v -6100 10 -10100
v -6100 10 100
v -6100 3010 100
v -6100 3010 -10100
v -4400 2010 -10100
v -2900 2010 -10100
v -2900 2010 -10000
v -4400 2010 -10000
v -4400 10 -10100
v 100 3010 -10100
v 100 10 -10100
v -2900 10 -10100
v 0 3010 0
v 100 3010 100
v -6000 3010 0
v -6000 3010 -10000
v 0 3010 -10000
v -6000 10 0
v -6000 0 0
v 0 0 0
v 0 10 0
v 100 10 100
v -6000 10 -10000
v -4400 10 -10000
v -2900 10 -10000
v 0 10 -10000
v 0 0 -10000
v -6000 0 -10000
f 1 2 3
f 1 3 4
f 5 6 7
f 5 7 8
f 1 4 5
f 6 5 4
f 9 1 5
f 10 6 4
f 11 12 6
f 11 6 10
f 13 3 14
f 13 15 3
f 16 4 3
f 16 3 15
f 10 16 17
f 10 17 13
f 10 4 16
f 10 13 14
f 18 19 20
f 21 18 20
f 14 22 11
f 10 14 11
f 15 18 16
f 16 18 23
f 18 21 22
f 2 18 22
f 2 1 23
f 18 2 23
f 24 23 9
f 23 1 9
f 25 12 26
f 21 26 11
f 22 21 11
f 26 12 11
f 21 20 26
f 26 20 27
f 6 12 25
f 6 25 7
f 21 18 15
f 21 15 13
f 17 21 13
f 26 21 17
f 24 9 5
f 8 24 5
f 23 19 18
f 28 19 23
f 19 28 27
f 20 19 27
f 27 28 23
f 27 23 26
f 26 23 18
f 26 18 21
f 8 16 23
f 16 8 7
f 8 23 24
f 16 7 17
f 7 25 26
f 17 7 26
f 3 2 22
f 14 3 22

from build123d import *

# Parameters (mm, degrees)
SKETCH1_W           = 6000
SKETCH1_H           = 10000
BOSS_EXTRUDE1_DEPTH = 10
SKETCH3_W           = 6200
SKETCH3_H           = 10200
SKETCH3_W_2         = 6000
SKETCH3_H_2         = 10000
BOSS_EXTRUDE2_DEPTH = 3000
SKETCH4_W           = 1500
SKETCH4_H           = 2000
CUT_EXTRUDE1_DEPTH  = 100


with BuildPart() as part:
    # Sketch1 → Boss-Extrude1 (new body)
    with BuildSketch(Plane(origin=(0, 0, 0), x_dir=(1, 0, 0), z_dir=(0, 1, 0))):
        with Locations((-3000, 5000)):
            Rectangle(SKETCH1_W, SKETCH1_H)
    extrude(amount=BOSS_EXTRUDE1_DEPTH)


with BuildPart() as body_2:
    # Sketch3 → Boss-Extrude2 (new body)
    with BuildSketch(Plane(origin=(0, 10, 0), x_dir=(1, 0, 0), z_dir=(0, 1, 0))):
        with Locations((-3000, 5000)):
            Rectangle(SKETCH3_W, SKETCH3_H)
        with Locations((-3000, 5000)):
            Rectangle(SKETCH3_W_2, SKETCH3_H_2, mode=Mode.SUBTRACT)
    extrude(amount=BOSS_EXTRUDE2_DEPTH)

    # Sketch4 → Cut-Extrude1 (cut)
    with BuildSketch(Plane(origin=(0, 0, -10100), x_dir=(-1, 0, 0), z_dir=(0, 0, -1))):
        with Locations((3650, 1010)):
            Rectangle(SKETCH4_W, SKETCH4_H)
    extrude(amount=-CUT_EXTRUDE1_DEPTH, mode=Mode.SUBTRACT)


solid = Compound([part.part, body_2.part])
